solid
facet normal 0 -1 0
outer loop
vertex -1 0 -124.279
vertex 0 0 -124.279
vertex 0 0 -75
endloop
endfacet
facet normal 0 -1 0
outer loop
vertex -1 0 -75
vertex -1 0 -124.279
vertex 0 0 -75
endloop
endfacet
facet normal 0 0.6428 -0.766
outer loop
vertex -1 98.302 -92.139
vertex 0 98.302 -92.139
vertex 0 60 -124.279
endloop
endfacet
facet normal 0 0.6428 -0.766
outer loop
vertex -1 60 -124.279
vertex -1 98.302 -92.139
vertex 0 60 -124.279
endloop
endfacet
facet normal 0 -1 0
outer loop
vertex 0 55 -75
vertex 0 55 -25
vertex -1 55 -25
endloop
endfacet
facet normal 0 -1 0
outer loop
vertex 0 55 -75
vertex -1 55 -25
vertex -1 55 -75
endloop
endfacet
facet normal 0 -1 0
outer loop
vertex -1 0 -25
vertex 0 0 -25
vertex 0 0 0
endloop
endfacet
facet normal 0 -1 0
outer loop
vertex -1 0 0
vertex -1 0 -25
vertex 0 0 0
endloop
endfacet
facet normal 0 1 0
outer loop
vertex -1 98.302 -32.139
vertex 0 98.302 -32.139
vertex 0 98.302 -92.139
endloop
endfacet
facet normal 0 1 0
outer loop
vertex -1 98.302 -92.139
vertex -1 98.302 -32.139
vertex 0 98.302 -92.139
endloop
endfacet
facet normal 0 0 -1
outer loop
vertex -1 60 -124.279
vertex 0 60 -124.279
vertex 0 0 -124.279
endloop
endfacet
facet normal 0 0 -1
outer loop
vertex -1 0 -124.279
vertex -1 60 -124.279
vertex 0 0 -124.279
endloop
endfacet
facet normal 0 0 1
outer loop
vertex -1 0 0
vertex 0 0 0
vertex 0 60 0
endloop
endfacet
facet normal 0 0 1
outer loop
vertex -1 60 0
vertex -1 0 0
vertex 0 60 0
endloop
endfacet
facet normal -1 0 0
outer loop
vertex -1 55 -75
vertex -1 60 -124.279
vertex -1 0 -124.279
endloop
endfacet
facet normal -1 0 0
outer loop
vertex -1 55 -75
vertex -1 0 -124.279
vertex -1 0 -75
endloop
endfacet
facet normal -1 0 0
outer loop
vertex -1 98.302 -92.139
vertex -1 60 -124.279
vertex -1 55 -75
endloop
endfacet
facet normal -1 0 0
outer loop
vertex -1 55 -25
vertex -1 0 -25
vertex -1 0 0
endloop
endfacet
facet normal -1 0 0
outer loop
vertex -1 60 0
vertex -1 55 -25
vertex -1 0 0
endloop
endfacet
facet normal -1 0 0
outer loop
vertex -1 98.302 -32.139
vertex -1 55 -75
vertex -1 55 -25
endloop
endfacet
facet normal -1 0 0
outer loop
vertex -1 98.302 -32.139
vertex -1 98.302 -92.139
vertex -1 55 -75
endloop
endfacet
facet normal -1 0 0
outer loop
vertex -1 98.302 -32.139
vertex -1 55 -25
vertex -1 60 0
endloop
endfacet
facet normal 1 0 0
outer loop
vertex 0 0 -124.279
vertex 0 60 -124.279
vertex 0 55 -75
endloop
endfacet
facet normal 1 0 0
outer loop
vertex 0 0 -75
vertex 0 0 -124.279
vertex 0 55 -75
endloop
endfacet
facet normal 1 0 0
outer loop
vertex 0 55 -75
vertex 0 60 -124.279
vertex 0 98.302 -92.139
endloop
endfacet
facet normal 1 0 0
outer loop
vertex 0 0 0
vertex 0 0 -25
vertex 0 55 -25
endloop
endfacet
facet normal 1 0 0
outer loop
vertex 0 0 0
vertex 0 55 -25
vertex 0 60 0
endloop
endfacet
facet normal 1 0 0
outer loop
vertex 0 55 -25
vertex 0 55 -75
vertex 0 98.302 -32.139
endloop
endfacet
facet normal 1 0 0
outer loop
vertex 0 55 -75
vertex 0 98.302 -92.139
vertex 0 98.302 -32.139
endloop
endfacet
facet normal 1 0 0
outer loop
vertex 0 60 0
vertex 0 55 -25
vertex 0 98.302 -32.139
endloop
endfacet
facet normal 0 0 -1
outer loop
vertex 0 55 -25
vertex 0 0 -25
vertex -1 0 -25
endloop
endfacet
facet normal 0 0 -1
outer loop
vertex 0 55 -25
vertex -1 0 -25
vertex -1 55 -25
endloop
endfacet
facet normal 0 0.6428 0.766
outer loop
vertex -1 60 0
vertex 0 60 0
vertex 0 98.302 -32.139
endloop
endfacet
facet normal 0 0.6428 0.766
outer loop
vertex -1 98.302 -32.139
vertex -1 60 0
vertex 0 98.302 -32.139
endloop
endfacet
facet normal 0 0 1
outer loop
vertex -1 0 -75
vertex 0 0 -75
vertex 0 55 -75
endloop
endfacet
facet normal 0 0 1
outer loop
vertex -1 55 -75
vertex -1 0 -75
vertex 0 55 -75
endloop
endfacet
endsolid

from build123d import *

# Parameters (mm, degrees)
EXTRUDE_1_DEPTH     = 1
SKETCH_2_W          = 50
SKETCH_2_H          = 55
CUT_EXTRUDE_1_DEPTH = 1


with BuildPart() as part:
    # 草图1 → 凸台-拉伸1 (new body)
    with BuildSketch(Plane(origin=(0, 0, 0), x_dir=(0, 0, -1), z_dir=(1, 0, 0))):
        Polygon((0, 0), (0, 60), (32.139380484, 98.302222156), (92.139380484, 98.302222156), (124.278760969, 60), (124.278760969, 0), align=None)
    extrude(amount=-EXTRUDE_1_DEPTH)

    # 草图2 → 切除-拉伸1 (cut)
    with BuildSketch(Plane(origin=(0, 0, 0), x_dir=(0, 0, -1), z_dir=(1, 0, 0))):
        with Locations((50, 27.5)):
            Rectangle(SKETCH_2_W, SKETCH_2_H)
    extrude(amount=-CUT_EXTRUDE_1_DEPTH, mode=Mode.SUBTRACT)


solid = part.part
